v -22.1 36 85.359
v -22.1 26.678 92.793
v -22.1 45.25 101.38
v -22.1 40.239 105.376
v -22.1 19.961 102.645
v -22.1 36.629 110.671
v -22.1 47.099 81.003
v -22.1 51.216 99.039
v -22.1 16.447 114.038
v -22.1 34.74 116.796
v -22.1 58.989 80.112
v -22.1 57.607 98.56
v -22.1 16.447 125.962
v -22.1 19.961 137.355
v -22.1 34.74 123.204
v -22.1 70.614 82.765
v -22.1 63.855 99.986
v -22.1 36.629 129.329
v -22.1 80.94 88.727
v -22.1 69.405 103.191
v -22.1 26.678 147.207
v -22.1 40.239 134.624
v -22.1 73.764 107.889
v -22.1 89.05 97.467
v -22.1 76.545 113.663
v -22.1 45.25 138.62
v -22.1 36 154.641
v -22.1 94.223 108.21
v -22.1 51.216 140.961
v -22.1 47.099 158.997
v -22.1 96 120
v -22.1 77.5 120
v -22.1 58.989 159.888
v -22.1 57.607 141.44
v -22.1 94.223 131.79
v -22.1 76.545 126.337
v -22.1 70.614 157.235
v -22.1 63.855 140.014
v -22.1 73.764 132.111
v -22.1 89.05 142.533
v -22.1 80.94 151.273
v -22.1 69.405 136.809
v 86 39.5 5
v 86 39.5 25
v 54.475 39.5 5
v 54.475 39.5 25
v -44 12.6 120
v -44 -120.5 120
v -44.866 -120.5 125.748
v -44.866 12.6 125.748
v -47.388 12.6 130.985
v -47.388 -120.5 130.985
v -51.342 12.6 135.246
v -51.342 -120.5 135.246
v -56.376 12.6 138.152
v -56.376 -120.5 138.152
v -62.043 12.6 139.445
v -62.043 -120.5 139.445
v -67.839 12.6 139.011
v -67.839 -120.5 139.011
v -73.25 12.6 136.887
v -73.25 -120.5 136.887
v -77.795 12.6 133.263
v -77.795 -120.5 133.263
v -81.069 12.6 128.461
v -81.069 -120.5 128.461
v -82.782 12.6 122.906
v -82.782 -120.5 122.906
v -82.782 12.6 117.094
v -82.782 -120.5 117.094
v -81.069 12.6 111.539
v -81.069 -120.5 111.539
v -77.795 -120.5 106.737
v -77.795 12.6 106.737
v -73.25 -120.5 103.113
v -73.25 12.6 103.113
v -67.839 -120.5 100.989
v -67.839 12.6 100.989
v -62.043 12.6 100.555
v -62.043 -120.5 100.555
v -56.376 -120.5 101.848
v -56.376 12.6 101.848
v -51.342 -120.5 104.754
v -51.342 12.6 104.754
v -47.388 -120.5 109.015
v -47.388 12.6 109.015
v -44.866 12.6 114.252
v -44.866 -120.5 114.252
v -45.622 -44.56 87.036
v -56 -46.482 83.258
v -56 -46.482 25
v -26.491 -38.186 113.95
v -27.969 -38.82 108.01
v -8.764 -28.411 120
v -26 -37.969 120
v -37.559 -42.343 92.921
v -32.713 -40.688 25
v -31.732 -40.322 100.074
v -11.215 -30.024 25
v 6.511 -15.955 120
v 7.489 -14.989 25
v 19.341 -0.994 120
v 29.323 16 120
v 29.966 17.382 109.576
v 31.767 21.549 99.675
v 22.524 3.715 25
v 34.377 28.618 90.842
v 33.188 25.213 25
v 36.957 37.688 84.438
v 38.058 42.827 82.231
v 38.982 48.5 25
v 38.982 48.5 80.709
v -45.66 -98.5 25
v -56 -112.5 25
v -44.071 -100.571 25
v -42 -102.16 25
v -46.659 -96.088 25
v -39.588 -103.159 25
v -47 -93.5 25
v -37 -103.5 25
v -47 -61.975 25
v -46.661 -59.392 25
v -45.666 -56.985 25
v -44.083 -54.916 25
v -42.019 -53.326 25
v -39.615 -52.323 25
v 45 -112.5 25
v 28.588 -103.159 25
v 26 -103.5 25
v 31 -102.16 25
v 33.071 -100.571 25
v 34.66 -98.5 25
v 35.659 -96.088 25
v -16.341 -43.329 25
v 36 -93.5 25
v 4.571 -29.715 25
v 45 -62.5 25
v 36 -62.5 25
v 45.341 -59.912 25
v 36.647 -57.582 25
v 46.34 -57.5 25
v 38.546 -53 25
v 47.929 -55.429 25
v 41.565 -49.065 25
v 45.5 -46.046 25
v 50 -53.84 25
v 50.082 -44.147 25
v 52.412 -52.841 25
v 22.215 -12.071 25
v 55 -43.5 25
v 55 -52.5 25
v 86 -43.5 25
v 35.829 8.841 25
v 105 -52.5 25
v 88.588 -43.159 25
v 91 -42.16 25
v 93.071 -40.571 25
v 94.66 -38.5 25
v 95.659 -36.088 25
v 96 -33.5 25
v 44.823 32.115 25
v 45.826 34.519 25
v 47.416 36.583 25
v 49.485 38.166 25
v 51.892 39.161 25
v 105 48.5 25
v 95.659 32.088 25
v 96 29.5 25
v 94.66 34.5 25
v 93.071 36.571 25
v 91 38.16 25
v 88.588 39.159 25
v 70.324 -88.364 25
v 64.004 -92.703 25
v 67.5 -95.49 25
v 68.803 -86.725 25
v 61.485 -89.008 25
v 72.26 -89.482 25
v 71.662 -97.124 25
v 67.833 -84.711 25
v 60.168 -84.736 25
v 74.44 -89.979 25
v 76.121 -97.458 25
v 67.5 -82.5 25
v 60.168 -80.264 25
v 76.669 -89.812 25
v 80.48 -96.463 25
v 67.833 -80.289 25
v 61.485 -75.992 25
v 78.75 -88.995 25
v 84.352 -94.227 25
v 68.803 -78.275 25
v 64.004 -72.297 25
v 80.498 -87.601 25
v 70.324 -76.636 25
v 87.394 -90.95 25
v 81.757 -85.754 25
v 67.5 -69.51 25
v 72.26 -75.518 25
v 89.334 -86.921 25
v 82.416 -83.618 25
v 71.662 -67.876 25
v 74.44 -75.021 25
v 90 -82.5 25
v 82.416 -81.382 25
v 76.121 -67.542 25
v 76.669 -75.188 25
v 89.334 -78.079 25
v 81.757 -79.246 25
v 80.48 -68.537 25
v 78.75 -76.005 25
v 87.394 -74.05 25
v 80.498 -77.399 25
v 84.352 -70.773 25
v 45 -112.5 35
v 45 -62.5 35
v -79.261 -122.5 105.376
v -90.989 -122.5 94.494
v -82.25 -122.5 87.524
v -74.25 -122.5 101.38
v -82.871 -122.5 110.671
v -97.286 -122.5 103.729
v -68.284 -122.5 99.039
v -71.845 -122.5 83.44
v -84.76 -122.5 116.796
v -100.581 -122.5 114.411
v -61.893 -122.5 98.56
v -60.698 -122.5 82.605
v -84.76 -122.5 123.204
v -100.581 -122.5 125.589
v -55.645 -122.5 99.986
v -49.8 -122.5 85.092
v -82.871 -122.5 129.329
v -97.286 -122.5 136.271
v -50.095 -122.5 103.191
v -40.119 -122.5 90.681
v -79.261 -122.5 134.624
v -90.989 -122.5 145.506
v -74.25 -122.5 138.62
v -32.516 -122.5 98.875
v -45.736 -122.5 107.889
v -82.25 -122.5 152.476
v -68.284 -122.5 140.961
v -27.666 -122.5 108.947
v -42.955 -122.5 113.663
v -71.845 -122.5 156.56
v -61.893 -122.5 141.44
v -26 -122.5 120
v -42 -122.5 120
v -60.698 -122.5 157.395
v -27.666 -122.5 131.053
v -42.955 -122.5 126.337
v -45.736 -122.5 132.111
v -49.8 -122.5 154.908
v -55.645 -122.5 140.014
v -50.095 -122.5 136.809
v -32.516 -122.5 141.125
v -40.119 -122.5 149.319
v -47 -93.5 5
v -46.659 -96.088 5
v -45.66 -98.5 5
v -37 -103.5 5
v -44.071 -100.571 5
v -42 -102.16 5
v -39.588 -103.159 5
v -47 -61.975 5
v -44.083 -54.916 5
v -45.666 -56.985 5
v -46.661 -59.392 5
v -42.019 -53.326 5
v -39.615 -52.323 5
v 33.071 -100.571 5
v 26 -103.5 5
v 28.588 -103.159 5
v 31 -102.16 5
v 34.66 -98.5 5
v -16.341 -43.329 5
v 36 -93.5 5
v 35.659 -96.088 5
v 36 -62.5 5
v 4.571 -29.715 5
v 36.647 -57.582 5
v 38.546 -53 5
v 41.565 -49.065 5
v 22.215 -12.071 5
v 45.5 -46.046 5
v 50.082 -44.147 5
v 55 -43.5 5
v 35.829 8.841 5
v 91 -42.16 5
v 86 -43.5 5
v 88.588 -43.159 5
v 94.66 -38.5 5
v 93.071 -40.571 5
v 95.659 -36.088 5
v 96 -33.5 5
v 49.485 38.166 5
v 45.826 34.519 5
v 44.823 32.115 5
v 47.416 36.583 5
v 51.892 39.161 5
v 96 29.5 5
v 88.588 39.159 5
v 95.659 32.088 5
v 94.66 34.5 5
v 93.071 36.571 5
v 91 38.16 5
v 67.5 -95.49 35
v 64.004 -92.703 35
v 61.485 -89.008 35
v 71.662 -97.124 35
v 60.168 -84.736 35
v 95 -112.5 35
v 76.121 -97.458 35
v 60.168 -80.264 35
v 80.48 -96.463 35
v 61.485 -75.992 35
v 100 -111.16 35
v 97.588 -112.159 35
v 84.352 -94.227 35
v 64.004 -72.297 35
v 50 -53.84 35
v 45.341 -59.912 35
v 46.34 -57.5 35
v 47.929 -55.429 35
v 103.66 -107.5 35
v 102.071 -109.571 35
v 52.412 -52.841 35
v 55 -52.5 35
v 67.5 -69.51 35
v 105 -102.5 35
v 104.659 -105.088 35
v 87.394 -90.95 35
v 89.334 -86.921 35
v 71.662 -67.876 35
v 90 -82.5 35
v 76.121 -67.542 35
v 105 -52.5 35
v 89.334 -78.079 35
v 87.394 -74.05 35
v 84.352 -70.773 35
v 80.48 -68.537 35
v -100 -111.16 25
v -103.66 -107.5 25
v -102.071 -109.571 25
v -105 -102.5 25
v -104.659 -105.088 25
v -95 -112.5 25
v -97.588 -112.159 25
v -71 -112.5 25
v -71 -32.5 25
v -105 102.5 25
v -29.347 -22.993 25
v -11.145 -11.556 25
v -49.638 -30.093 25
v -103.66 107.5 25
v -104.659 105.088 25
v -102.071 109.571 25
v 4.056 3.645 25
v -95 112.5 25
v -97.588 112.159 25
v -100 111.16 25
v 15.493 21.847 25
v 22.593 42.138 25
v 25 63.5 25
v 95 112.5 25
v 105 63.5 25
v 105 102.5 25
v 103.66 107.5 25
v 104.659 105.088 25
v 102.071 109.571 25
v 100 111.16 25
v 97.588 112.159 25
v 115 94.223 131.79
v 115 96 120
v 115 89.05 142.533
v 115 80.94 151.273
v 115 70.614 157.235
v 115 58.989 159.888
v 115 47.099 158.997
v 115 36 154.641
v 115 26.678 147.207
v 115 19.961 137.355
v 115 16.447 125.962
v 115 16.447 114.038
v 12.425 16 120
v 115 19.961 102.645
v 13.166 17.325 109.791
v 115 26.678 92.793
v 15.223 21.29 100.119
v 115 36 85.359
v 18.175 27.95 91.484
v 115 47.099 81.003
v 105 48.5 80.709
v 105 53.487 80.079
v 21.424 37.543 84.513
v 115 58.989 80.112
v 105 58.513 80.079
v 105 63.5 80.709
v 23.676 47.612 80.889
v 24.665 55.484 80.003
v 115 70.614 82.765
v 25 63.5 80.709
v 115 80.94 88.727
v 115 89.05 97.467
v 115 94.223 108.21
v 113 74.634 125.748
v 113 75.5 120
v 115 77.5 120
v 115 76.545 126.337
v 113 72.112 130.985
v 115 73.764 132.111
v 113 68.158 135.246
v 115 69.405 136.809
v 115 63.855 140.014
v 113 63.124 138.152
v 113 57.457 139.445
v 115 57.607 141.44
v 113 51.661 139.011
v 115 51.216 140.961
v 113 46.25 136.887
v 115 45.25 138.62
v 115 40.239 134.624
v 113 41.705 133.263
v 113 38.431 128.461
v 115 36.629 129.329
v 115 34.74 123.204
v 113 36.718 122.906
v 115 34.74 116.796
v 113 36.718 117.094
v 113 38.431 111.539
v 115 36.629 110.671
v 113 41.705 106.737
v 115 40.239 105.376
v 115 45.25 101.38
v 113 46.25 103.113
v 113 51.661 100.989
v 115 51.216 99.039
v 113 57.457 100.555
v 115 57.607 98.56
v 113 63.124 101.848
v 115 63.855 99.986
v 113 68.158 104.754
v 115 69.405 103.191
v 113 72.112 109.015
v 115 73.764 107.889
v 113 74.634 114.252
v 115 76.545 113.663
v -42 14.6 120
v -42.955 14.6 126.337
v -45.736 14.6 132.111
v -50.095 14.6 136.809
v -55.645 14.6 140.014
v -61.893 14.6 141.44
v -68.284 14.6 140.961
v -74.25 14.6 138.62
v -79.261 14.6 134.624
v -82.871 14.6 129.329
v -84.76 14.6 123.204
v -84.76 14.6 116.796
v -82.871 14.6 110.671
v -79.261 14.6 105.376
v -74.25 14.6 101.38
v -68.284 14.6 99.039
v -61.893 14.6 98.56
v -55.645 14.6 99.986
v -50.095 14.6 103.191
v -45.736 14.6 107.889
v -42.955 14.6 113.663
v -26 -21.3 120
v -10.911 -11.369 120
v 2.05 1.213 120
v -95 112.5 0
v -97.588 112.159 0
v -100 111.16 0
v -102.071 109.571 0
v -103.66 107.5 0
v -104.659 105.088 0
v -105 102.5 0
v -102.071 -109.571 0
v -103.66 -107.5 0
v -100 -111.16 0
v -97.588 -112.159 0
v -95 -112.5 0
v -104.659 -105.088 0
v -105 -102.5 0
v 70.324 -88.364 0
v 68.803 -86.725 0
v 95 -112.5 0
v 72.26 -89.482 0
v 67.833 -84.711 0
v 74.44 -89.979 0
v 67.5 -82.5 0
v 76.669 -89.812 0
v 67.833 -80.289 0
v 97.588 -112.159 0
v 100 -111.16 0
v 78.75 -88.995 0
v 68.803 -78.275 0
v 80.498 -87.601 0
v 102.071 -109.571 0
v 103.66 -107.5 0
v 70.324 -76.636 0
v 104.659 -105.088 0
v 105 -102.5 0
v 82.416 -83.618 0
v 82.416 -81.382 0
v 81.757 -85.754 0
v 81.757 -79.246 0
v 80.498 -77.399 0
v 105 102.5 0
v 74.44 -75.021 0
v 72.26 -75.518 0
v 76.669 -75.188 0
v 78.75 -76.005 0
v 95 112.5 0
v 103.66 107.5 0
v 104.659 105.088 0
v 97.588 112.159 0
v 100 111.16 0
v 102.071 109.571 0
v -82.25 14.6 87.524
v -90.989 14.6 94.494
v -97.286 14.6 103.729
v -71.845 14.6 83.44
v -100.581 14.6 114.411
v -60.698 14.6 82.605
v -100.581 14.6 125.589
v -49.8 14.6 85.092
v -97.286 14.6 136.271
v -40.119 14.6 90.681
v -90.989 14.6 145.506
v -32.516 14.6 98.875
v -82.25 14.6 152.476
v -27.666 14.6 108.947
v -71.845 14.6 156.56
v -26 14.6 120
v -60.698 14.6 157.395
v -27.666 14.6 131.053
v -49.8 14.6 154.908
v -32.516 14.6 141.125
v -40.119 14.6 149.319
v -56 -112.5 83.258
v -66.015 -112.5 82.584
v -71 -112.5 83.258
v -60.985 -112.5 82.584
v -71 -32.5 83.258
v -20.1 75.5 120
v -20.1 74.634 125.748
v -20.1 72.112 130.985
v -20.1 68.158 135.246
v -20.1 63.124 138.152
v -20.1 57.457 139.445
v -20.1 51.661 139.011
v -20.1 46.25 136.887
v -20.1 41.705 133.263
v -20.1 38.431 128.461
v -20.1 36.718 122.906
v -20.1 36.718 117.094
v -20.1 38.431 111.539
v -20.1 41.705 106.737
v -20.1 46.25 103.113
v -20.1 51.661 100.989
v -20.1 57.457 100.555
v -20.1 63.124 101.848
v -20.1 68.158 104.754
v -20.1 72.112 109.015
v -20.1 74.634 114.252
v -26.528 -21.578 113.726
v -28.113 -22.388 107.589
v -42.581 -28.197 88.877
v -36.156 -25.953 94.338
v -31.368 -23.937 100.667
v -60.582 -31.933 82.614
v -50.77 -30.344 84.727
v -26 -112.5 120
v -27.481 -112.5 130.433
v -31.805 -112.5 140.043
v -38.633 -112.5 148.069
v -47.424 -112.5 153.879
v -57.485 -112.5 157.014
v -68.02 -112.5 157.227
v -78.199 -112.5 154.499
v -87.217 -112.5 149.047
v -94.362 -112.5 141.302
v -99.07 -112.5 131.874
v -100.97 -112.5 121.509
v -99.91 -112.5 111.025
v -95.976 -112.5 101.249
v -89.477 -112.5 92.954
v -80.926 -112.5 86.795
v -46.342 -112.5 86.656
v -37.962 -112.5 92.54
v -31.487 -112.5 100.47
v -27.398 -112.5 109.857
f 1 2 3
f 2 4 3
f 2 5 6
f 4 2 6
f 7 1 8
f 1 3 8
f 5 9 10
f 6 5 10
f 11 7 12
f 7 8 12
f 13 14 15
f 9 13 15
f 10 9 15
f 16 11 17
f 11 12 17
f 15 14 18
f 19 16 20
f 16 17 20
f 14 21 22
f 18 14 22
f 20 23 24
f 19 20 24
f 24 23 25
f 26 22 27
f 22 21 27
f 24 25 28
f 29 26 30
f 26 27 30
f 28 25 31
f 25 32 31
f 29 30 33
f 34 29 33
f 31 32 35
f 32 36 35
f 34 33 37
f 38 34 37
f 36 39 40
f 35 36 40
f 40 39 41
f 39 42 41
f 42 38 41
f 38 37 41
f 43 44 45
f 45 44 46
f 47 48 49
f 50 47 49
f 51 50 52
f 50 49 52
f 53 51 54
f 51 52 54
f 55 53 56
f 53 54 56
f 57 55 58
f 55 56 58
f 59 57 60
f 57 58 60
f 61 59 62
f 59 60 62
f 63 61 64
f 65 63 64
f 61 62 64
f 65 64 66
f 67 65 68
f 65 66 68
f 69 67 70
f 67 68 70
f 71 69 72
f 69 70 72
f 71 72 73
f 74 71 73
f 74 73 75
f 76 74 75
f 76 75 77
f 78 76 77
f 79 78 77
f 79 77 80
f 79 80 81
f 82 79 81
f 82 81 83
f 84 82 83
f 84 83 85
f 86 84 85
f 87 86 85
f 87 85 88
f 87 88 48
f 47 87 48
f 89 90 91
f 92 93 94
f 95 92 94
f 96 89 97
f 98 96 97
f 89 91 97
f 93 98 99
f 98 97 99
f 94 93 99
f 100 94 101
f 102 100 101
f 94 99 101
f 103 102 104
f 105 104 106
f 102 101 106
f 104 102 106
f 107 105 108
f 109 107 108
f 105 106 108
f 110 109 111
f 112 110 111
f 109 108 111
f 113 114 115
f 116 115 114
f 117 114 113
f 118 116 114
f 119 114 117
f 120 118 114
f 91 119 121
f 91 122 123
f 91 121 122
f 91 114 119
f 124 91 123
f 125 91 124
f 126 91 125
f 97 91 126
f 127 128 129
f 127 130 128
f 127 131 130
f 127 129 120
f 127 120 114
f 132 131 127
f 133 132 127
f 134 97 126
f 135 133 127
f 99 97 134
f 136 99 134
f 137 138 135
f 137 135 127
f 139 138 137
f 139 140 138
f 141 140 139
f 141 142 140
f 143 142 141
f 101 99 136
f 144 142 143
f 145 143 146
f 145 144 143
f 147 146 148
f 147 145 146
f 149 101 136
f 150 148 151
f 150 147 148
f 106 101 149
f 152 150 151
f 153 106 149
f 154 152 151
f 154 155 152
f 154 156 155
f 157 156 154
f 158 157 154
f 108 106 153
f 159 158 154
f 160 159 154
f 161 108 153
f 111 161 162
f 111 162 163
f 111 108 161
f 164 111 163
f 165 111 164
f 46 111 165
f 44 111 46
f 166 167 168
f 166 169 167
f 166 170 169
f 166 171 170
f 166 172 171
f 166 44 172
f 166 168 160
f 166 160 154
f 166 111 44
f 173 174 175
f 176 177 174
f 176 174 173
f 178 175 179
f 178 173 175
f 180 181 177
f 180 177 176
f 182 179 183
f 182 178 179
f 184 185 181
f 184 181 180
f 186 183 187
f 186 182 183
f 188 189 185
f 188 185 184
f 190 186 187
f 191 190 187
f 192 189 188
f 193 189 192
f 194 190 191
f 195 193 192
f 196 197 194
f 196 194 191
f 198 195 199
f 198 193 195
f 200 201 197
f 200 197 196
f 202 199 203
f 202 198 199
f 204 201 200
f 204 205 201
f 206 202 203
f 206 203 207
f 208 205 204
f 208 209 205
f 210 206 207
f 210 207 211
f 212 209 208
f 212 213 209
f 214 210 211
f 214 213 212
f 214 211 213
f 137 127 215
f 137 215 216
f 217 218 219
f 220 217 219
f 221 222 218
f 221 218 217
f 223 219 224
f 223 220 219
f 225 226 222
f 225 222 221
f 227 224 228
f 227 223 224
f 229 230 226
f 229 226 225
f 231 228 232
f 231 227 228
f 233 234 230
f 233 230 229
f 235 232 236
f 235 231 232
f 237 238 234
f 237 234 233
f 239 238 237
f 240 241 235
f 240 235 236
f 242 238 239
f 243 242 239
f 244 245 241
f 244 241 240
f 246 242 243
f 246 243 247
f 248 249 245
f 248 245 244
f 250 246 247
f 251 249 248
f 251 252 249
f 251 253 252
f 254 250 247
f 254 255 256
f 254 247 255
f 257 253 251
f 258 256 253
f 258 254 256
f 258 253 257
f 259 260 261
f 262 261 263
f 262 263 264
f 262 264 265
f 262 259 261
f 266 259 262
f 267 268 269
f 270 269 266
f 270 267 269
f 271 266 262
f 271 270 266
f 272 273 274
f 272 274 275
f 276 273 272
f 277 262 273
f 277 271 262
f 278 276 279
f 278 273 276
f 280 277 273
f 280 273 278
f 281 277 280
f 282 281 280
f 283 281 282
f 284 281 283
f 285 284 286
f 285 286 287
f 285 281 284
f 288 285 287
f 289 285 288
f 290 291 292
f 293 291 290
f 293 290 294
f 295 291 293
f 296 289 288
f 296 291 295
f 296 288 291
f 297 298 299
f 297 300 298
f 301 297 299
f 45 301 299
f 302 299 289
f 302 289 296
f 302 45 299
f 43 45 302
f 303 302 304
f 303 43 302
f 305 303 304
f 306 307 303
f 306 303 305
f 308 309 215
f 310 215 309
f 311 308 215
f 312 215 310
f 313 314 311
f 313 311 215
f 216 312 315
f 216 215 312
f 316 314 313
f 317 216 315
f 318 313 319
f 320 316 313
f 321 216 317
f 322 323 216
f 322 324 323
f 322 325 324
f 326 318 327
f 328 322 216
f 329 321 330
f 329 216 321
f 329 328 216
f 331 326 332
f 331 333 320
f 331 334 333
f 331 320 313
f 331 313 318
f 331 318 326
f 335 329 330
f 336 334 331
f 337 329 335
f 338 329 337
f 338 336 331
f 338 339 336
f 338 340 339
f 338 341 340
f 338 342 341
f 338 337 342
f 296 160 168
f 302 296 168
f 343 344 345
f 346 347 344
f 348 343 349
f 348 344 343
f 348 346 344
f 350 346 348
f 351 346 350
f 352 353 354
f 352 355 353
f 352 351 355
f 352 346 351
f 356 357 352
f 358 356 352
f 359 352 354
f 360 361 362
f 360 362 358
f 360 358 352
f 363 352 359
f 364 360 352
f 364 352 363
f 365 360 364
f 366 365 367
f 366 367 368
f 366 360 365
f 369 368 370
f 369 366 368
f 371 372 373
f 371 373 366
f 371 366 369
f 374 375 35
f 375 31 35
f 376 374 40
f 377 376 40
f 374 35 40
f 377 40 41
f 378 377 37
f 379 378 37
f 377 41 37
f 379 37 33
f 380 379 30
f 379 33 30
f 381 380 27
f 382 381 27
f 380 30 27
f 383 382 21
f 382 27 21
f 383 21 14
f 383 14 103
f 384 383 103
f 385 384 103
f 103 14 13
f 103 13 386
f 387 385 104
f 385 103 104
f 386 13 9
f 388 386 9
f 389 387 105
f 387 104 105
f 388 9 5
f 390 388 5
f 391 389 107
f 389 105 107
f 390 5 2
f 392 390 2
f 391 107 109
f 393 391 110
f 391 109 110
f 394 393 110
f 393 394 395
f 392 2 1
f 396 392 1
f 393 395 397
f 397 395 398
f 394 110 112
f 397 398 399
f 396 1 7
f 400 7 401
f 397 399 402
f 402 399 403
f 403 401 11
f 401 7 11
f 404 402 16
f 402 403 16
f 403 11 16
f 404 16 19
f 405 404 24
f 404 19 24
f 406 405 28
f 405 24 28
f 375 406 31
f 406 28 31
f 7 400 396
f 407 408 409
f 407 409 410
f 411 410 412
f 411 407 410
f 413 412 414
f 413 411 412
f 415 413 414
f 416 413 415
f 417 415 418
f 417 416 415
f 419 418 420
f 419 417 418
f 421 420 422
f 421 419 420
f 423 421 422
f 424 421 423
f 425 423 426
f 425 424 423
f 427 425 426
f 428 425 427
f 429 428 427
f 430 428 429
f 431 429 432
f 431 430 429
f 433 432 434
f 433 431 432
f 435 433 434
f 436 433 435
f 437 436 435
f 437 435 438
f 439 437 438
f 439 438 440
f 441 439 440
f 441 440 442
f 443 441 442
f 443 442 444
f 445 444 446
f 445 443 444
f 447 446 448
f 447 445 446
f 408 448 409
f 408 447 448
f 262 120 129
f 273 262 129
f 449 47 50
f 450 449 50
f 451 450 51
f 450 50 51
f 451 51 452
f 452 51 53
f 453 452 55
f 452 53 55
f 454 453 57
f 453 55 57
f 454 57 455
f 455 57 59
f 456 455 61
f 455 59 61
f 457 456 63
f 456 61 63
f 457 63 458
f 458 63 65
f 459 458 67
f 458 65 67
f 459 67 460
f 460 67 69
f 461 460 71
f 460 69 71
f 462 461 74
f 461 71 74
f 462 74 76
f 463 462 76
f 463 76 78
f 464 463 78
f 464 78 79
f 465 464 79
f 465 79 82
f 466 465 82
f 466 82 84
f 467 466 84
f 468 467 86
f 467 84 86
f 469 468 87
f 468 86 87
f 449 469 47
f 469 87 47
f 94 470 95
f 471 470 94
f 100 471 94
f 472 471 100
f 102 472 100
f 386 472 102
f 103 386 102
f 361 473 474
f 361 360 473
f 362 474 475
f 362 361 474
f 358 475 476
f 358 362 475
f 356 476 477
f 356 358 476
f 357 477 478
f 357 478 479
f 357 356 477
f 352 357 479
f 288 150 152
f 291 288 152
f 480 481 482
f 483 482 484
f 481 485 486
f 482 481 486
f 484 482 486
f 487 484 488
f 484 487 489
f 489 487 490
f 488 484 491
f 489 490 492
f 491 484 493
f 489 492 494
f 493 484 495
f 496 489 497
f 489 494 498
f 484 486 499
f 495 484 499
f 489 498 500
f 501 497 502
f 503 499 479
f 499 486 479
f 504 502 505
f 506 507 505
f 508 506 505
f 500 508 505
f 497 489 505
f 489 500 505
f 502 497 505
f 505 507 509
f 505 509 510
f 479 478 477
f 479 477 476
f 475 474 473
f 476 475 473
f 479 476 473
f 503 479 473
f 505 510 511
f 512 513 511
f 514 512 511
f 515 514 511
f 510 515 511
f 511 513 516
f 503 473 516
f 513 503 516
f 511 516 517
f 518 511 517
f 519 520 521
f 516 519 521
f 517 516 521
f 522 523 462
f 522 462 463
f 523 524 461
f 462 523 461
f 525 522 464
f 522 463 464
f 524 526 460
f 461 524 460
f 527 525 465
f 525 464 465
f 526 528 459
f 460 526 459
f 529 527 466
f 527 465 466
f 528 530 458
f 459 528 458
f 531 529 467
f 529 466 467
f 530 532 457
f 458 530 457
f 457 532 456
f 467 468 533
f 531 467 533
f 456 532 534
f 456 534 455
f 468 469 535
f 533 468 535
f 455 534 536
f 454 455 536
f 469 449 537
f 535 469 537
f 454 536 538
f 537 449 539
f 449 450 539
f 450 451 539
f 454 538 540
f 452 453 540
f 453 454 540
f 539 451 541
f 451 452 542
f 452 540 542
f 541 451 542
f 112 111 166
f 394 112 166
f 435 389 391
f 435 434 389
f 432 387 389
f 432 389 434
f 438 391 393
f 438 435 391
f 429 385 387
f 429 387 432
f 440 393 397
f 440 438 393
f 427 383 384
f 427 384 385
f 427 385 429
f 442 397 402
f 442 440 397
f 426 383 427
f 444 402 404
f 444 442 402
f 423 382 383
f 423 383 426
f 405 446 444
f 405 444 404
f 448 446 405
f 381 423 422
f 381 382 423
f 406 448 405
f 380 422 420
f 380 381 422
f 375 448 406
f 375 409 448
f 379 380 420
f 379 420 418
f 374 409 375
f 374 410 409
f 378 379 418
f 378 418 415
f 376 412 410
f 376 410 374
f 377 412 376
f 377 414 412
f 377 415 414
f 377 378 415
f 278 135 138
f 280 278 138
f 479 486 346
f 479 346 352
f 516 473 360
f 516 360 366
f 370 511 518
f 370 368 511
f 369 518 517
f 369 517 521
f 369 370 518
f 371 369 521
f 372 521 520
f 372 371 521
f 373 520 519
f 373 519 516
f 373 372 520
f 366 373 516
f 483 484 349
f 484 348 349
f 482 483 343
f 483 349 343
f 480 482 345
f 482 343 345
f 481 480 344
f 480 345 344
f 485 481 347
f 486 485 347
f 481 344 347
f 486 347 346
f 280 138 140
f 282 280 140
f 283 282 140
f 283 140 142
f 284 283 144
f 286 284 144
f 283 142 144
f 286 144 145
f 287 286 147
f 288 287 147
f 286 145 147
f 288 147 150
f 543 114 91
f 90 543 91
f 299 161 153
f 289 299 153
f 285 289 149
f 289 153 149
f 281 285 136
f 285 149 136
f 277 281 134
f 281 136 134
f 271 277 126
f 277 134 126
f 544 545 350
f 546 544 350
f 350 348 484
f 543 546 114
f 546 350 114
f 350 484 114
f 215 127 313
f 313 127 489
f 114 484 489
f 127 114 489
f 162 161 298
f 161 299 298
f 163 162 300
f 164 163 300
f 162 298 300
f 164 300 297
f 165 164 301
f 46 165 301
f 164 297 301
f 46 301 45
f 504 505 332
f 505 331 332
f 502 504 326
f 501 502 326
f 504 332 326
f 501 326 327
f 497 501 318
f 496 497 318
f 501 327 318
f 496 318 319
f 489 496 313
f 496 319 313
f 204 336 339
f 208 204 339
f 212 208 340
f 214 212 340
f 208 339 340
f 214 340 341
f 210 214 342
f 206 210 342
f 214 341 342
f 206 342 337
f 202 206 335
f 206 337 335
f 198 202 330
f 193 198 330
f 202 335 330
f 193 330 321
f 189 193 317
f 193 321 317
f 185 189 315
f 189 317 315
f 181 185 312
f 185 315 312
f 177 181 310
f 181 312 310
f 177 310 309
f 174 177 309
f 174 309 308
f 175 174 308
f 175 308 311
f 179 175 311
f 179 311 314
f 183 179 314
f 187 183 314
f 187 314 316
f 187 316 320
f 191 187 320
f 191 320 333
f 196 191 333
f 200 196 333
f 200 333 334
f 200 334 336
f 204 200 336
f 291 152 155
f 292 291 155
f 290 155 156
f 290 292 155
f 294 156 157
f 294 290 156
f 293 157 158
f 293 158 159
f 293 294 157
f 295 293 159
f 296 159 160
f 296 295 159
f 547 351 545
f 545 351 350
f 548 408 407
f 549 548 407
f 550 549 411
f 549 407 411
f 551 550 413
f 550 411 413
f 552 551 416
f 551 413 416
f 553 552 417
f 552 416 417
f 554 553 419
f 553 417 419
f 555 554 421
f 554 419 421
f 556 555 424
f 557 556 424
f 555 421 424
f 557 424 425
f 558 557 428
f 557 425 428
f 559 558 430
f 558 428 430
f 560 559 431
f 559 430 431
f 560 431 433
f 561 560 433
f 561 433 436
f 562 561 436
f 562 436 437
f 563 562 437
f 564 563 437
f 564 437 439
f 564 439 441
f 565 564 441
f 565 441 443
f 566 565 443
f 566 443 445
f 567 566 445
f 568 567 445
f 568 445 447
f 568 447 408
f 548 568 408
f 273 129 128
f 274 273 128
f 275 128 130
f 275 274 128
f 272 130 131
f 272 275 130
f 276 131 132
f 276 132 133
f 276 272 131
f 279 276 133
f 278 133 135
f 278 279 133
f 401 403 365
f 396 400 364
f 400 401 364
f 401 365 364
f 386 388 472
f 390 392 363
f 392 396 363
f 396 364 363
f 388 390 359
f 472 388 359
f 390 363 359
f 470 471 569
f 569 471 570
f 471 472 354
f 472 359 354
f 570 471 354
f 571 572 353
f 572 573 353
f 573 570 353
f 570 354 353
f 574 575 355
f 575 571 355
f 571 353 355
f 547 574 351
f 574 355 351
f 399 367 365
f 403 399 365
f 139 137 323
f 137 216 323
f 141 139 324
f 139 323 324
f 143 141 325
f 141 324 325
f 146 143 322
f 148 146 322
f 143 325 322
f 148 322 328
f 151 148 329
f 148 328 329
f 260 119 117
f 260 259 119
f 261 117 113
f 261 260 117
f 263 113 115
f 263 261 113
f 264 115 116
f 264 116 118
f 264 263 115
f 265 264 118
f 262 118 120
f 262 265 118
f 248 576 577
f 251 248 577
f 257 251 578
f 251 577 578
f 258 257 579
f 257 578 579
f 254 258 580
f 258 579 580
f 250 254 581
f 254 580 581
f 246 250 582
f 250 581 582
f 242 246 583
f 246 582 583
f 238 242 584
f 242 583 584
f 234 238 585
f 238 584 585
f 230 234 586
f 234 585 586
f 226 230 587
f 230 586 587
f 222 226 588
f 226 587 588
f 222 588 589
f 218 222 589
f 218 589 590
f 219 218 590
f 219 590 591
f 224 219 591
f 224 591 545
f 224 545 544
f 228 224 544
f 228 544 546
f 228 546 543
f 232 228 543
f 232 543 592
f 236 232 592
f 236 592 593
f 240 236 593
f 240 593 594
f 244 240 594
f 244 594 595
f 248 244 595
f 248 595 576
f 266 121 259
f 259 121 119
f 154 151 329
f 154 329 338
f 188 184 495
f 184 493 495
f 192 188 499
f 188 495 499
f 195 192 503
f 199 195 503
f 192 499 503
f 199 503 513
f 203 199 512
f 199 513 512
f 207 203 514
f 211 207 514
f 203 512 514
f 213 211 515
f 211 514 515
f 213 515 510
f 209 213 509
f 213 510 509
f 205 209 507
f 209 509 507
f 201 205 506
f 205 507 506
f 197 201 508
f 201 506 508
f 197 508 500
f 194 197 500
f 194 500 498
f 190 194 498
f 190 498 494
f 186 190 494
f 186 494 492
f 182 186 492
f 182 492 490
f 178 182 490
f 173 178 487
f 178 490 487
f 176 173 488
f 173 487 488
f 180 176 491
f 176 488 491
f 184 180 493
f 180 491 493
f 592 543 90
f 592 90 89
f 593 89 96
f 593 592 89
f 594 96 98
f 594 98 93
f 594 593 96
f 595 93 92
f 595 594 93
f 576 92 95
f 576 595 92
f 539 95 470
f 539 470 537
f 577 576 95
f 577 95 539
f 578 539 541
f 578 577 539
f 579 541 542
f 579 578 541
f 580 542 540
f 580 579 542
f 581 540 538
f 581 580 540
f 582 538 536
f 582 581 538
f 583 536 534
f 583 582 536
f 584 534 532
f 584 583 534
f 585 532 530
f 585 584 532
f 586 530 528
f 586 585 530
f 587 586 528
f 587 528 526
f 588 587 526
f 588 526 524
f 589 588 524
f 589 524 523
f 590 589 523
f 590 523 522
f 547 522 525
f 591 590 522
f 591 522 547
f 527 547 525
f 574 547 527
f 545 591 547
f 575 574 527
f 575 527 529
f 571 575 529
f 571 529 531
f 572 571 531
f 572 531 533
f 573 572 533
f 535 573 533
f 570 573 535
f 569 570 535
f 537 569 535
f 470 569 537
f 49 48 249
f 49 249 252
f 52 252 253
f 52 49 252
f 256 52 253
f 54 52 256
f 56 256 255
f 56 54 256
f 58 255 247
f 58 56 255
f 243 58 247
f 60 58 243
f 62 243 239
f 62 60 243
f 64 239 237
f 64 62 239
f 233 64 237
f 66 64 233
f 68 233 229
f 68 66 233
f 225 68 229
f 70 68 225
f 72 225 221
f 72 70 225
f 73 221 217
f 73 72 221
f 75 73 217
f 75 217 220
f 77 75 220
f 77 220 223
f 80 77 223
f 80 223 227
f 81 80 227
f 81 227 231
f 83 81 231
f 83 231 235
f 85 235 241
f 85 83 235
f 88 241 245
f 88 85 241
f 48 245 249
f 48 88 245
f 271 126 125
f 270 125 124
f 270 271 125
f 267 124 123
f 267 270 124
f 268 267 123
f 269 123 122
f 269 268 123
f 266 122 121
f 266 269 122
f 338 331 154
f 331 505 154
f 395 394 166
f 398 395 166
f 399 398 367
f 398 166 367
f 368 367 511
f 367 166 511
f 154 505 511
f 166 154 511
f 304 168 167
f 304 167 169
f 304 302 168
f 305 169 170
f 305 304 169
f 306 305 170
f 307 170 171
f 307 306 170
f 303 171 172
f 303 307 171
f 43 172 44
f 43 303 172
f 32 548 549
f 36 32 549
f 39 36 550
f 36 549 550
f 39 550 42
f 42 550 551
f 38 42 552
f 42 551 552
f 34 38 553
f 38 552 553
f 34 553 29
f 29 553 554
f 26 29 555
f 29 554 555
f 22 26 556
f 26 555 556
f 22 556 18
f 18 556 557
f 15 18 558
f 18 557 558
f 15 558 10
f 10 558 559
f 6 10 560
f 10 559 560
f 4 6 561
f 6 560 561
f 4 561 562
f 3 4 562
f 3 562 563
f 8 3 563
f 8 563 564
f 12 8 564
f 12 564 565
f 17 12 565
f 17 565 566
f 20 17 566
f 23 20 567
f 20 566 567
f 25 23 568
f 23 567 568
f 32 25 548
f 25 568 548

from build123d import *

# Parameters (mm, degrees)
F0_W            = 210
F0_H            = 225
F1_DEPTH        = 25
F3_DEPTH        = 95
F4_R            = 37.5
F5_DEPTH        = 10
F5_DEPTH_BACK   = 127.1
F6_R            = 40
F7_DEPTH        = 10
F7_DEPTH_BACK   = 127.1
F8_W            = 60
F8_H            = 60
F9_DEPTH        = 10
F10_R           = 10
F12_DEPTH       = 20
F14_D           = 15
F14_CBORE_D     = 30
F14_CBORE_DEPTH = 10
F15_R           = 10
F16_R           = 19.5
F17_DEPTH       = 235.001
F18_R           = 19.5
F19_DEPTH       = 220.001
F20_SIZE        = 2
F21_R           = 10


with BuildPart() as f1:
    # F0 (on Top) → F1 (new body)
    with BuildSketch(Plane.XY):
        Rectangle(F0_W, F0_H)
    extrude(amount=F1_DEPTH)

    # F2 (on face) → F3 (join)
    with BuildSketch(Plane.XY.offset(25)):
        with BuildLine():
            Line((-71, -32.5), (-71, -112.5))
            Line((-71, -112.5), (-56, -112.5))
            Line((-56, -112.5), (-56, -46.481817))
            ThreePointArc((-56, -46.481817), (7.488853, -14.988853), (38.981817, 48.5))
            Line((38.981817, 48.5), (105, 48.5))
            Line((105, 48.5), (105, 63.5))
            Line((105, 63.5), (25, 63.5))
            ThreePointArc((25, 63.5), (-3.117749, -4.382251), (-71, -32.5))
        make_face()
    extrude(amount=F3_DEPTH)

    # F4 (on face) → F5 (join, two sides)
    with BuildSketch(Plane.XZ.offset(112.5)) as f5_sk:
        with Locations((-63.5, 120)):
            Circle(F4_R)
    extrude(amount=F5_DEPTH)
    extrude(f5_sk.sketch, amount=-F5_DEPTH_BACK)

    # F6 (on face) → F7 (join, two sides)
    with BuildSketch(Plane.YZ.offset(105)) as f7_sk:
        with Locations((56, 120)):
            Circle(F6_R)
    extrude(amount=F7_DEPTH)
    extrude(f7_sk.sketch, amount=-F7_DEPTH_BACK)

    # F8 (on face) → F9 (join)
    with BuildSketch(Plane.XY.offset(25)):
        with Locations((75, -82.5)):
            Rectangle(F8_W, F8_H)
    extrude(amount=F9_DEPTH)

    # F10
    f10_edges = [f1.edges().sort_by_distance(p)[0] for p in [
        (45, -52.5, 30),
    ]]
    fillet(f10_edges, radius=F10_R)

    # F11 (on face) → F12 (cut)
    with BuildSketch(Plane.XY.offset(25)):
        with BuildLine():
            ThreePointArc((46.575508, 39.5), (13.852814, -21.352814), (-47, -54.075508))
            Line((-47, -54.075508), (-47, -103.5))
            Line((-47, -103.5), (36, -103.5))
            Line((36, -103.5), (36, -62.5))
            ThreePointArc((36, -62.5), (41.564971, -49.064971), (55, -43.5))
            Line((55, -43.5), (96, -43.5))
            Line((96, -43.5), (96, 39.5))
            Line((96, 39.5), (46.575508, 39.5))
        make_face()
    extrude(amount=-F12_DEPTH, mode=Mode.SUBTRACT)

    # F14 (through all)
    with Locations(Plane.XY.offset(35)):
        with Locations((75, -82.5)):
            CounterBoreHole(F14_D / 2, F14_CBORE_D / 2, F14_CBORE_DEPTH)

    # F15
    f15_edges = [f1.edges().sort_by_distance(p)[0] for p in [
        (-47, -54.075508, 15),
        (46.575508, 39.5, 15),
        (-47, -103.5, 15),
        (36, -103.5, 15),
        (96, -43.5, 15),
        (96, 39.5, 15),
    ]]
    fillet(f15_edges, radius=F15_R)

    # F16 (on face) → F17 (cut, through all)
    with BuildSketch(Plane.XZ.offset(122.5)):
        with Locations((-63.5, 120)):
            Circle(F16_R)
    extrude(amount=-F17_DEPTH, mode=Mode.SUBTRACT)

    # F18 (on face) → F19 (cut, through all)
    with BuildSketch(Plane.YZ.offset(115)):
        with Locations((56, 120)):
            Circle(F18_R)
    extrude(amount=-F19_DEPTH, mode=Mode.SUBTRACT)

    # F20
    f20_edges = [f1.edges().sort_by_distance(p)[0] for p in [
        (115, 36.5, 120),
        (-83, -122.5, 120),
        (-83, 14.6, 120),
        (-22.1, 36.5, 120),
    ]]
    chamfer(f20_edges, length=F20_SIZE)

    # F21
    f21_edges = [f1.edges().sort_by_distance(p)[0] for p in [
        (-105, 112.5, 12.5),
        (105, 112.5, 12.5),
        (105, -112.5, 17.5),
        (-105, -112.5, 12.5),
    ]]
    fillet(f21_edges, radius=F21_R)


solid = f1.part
